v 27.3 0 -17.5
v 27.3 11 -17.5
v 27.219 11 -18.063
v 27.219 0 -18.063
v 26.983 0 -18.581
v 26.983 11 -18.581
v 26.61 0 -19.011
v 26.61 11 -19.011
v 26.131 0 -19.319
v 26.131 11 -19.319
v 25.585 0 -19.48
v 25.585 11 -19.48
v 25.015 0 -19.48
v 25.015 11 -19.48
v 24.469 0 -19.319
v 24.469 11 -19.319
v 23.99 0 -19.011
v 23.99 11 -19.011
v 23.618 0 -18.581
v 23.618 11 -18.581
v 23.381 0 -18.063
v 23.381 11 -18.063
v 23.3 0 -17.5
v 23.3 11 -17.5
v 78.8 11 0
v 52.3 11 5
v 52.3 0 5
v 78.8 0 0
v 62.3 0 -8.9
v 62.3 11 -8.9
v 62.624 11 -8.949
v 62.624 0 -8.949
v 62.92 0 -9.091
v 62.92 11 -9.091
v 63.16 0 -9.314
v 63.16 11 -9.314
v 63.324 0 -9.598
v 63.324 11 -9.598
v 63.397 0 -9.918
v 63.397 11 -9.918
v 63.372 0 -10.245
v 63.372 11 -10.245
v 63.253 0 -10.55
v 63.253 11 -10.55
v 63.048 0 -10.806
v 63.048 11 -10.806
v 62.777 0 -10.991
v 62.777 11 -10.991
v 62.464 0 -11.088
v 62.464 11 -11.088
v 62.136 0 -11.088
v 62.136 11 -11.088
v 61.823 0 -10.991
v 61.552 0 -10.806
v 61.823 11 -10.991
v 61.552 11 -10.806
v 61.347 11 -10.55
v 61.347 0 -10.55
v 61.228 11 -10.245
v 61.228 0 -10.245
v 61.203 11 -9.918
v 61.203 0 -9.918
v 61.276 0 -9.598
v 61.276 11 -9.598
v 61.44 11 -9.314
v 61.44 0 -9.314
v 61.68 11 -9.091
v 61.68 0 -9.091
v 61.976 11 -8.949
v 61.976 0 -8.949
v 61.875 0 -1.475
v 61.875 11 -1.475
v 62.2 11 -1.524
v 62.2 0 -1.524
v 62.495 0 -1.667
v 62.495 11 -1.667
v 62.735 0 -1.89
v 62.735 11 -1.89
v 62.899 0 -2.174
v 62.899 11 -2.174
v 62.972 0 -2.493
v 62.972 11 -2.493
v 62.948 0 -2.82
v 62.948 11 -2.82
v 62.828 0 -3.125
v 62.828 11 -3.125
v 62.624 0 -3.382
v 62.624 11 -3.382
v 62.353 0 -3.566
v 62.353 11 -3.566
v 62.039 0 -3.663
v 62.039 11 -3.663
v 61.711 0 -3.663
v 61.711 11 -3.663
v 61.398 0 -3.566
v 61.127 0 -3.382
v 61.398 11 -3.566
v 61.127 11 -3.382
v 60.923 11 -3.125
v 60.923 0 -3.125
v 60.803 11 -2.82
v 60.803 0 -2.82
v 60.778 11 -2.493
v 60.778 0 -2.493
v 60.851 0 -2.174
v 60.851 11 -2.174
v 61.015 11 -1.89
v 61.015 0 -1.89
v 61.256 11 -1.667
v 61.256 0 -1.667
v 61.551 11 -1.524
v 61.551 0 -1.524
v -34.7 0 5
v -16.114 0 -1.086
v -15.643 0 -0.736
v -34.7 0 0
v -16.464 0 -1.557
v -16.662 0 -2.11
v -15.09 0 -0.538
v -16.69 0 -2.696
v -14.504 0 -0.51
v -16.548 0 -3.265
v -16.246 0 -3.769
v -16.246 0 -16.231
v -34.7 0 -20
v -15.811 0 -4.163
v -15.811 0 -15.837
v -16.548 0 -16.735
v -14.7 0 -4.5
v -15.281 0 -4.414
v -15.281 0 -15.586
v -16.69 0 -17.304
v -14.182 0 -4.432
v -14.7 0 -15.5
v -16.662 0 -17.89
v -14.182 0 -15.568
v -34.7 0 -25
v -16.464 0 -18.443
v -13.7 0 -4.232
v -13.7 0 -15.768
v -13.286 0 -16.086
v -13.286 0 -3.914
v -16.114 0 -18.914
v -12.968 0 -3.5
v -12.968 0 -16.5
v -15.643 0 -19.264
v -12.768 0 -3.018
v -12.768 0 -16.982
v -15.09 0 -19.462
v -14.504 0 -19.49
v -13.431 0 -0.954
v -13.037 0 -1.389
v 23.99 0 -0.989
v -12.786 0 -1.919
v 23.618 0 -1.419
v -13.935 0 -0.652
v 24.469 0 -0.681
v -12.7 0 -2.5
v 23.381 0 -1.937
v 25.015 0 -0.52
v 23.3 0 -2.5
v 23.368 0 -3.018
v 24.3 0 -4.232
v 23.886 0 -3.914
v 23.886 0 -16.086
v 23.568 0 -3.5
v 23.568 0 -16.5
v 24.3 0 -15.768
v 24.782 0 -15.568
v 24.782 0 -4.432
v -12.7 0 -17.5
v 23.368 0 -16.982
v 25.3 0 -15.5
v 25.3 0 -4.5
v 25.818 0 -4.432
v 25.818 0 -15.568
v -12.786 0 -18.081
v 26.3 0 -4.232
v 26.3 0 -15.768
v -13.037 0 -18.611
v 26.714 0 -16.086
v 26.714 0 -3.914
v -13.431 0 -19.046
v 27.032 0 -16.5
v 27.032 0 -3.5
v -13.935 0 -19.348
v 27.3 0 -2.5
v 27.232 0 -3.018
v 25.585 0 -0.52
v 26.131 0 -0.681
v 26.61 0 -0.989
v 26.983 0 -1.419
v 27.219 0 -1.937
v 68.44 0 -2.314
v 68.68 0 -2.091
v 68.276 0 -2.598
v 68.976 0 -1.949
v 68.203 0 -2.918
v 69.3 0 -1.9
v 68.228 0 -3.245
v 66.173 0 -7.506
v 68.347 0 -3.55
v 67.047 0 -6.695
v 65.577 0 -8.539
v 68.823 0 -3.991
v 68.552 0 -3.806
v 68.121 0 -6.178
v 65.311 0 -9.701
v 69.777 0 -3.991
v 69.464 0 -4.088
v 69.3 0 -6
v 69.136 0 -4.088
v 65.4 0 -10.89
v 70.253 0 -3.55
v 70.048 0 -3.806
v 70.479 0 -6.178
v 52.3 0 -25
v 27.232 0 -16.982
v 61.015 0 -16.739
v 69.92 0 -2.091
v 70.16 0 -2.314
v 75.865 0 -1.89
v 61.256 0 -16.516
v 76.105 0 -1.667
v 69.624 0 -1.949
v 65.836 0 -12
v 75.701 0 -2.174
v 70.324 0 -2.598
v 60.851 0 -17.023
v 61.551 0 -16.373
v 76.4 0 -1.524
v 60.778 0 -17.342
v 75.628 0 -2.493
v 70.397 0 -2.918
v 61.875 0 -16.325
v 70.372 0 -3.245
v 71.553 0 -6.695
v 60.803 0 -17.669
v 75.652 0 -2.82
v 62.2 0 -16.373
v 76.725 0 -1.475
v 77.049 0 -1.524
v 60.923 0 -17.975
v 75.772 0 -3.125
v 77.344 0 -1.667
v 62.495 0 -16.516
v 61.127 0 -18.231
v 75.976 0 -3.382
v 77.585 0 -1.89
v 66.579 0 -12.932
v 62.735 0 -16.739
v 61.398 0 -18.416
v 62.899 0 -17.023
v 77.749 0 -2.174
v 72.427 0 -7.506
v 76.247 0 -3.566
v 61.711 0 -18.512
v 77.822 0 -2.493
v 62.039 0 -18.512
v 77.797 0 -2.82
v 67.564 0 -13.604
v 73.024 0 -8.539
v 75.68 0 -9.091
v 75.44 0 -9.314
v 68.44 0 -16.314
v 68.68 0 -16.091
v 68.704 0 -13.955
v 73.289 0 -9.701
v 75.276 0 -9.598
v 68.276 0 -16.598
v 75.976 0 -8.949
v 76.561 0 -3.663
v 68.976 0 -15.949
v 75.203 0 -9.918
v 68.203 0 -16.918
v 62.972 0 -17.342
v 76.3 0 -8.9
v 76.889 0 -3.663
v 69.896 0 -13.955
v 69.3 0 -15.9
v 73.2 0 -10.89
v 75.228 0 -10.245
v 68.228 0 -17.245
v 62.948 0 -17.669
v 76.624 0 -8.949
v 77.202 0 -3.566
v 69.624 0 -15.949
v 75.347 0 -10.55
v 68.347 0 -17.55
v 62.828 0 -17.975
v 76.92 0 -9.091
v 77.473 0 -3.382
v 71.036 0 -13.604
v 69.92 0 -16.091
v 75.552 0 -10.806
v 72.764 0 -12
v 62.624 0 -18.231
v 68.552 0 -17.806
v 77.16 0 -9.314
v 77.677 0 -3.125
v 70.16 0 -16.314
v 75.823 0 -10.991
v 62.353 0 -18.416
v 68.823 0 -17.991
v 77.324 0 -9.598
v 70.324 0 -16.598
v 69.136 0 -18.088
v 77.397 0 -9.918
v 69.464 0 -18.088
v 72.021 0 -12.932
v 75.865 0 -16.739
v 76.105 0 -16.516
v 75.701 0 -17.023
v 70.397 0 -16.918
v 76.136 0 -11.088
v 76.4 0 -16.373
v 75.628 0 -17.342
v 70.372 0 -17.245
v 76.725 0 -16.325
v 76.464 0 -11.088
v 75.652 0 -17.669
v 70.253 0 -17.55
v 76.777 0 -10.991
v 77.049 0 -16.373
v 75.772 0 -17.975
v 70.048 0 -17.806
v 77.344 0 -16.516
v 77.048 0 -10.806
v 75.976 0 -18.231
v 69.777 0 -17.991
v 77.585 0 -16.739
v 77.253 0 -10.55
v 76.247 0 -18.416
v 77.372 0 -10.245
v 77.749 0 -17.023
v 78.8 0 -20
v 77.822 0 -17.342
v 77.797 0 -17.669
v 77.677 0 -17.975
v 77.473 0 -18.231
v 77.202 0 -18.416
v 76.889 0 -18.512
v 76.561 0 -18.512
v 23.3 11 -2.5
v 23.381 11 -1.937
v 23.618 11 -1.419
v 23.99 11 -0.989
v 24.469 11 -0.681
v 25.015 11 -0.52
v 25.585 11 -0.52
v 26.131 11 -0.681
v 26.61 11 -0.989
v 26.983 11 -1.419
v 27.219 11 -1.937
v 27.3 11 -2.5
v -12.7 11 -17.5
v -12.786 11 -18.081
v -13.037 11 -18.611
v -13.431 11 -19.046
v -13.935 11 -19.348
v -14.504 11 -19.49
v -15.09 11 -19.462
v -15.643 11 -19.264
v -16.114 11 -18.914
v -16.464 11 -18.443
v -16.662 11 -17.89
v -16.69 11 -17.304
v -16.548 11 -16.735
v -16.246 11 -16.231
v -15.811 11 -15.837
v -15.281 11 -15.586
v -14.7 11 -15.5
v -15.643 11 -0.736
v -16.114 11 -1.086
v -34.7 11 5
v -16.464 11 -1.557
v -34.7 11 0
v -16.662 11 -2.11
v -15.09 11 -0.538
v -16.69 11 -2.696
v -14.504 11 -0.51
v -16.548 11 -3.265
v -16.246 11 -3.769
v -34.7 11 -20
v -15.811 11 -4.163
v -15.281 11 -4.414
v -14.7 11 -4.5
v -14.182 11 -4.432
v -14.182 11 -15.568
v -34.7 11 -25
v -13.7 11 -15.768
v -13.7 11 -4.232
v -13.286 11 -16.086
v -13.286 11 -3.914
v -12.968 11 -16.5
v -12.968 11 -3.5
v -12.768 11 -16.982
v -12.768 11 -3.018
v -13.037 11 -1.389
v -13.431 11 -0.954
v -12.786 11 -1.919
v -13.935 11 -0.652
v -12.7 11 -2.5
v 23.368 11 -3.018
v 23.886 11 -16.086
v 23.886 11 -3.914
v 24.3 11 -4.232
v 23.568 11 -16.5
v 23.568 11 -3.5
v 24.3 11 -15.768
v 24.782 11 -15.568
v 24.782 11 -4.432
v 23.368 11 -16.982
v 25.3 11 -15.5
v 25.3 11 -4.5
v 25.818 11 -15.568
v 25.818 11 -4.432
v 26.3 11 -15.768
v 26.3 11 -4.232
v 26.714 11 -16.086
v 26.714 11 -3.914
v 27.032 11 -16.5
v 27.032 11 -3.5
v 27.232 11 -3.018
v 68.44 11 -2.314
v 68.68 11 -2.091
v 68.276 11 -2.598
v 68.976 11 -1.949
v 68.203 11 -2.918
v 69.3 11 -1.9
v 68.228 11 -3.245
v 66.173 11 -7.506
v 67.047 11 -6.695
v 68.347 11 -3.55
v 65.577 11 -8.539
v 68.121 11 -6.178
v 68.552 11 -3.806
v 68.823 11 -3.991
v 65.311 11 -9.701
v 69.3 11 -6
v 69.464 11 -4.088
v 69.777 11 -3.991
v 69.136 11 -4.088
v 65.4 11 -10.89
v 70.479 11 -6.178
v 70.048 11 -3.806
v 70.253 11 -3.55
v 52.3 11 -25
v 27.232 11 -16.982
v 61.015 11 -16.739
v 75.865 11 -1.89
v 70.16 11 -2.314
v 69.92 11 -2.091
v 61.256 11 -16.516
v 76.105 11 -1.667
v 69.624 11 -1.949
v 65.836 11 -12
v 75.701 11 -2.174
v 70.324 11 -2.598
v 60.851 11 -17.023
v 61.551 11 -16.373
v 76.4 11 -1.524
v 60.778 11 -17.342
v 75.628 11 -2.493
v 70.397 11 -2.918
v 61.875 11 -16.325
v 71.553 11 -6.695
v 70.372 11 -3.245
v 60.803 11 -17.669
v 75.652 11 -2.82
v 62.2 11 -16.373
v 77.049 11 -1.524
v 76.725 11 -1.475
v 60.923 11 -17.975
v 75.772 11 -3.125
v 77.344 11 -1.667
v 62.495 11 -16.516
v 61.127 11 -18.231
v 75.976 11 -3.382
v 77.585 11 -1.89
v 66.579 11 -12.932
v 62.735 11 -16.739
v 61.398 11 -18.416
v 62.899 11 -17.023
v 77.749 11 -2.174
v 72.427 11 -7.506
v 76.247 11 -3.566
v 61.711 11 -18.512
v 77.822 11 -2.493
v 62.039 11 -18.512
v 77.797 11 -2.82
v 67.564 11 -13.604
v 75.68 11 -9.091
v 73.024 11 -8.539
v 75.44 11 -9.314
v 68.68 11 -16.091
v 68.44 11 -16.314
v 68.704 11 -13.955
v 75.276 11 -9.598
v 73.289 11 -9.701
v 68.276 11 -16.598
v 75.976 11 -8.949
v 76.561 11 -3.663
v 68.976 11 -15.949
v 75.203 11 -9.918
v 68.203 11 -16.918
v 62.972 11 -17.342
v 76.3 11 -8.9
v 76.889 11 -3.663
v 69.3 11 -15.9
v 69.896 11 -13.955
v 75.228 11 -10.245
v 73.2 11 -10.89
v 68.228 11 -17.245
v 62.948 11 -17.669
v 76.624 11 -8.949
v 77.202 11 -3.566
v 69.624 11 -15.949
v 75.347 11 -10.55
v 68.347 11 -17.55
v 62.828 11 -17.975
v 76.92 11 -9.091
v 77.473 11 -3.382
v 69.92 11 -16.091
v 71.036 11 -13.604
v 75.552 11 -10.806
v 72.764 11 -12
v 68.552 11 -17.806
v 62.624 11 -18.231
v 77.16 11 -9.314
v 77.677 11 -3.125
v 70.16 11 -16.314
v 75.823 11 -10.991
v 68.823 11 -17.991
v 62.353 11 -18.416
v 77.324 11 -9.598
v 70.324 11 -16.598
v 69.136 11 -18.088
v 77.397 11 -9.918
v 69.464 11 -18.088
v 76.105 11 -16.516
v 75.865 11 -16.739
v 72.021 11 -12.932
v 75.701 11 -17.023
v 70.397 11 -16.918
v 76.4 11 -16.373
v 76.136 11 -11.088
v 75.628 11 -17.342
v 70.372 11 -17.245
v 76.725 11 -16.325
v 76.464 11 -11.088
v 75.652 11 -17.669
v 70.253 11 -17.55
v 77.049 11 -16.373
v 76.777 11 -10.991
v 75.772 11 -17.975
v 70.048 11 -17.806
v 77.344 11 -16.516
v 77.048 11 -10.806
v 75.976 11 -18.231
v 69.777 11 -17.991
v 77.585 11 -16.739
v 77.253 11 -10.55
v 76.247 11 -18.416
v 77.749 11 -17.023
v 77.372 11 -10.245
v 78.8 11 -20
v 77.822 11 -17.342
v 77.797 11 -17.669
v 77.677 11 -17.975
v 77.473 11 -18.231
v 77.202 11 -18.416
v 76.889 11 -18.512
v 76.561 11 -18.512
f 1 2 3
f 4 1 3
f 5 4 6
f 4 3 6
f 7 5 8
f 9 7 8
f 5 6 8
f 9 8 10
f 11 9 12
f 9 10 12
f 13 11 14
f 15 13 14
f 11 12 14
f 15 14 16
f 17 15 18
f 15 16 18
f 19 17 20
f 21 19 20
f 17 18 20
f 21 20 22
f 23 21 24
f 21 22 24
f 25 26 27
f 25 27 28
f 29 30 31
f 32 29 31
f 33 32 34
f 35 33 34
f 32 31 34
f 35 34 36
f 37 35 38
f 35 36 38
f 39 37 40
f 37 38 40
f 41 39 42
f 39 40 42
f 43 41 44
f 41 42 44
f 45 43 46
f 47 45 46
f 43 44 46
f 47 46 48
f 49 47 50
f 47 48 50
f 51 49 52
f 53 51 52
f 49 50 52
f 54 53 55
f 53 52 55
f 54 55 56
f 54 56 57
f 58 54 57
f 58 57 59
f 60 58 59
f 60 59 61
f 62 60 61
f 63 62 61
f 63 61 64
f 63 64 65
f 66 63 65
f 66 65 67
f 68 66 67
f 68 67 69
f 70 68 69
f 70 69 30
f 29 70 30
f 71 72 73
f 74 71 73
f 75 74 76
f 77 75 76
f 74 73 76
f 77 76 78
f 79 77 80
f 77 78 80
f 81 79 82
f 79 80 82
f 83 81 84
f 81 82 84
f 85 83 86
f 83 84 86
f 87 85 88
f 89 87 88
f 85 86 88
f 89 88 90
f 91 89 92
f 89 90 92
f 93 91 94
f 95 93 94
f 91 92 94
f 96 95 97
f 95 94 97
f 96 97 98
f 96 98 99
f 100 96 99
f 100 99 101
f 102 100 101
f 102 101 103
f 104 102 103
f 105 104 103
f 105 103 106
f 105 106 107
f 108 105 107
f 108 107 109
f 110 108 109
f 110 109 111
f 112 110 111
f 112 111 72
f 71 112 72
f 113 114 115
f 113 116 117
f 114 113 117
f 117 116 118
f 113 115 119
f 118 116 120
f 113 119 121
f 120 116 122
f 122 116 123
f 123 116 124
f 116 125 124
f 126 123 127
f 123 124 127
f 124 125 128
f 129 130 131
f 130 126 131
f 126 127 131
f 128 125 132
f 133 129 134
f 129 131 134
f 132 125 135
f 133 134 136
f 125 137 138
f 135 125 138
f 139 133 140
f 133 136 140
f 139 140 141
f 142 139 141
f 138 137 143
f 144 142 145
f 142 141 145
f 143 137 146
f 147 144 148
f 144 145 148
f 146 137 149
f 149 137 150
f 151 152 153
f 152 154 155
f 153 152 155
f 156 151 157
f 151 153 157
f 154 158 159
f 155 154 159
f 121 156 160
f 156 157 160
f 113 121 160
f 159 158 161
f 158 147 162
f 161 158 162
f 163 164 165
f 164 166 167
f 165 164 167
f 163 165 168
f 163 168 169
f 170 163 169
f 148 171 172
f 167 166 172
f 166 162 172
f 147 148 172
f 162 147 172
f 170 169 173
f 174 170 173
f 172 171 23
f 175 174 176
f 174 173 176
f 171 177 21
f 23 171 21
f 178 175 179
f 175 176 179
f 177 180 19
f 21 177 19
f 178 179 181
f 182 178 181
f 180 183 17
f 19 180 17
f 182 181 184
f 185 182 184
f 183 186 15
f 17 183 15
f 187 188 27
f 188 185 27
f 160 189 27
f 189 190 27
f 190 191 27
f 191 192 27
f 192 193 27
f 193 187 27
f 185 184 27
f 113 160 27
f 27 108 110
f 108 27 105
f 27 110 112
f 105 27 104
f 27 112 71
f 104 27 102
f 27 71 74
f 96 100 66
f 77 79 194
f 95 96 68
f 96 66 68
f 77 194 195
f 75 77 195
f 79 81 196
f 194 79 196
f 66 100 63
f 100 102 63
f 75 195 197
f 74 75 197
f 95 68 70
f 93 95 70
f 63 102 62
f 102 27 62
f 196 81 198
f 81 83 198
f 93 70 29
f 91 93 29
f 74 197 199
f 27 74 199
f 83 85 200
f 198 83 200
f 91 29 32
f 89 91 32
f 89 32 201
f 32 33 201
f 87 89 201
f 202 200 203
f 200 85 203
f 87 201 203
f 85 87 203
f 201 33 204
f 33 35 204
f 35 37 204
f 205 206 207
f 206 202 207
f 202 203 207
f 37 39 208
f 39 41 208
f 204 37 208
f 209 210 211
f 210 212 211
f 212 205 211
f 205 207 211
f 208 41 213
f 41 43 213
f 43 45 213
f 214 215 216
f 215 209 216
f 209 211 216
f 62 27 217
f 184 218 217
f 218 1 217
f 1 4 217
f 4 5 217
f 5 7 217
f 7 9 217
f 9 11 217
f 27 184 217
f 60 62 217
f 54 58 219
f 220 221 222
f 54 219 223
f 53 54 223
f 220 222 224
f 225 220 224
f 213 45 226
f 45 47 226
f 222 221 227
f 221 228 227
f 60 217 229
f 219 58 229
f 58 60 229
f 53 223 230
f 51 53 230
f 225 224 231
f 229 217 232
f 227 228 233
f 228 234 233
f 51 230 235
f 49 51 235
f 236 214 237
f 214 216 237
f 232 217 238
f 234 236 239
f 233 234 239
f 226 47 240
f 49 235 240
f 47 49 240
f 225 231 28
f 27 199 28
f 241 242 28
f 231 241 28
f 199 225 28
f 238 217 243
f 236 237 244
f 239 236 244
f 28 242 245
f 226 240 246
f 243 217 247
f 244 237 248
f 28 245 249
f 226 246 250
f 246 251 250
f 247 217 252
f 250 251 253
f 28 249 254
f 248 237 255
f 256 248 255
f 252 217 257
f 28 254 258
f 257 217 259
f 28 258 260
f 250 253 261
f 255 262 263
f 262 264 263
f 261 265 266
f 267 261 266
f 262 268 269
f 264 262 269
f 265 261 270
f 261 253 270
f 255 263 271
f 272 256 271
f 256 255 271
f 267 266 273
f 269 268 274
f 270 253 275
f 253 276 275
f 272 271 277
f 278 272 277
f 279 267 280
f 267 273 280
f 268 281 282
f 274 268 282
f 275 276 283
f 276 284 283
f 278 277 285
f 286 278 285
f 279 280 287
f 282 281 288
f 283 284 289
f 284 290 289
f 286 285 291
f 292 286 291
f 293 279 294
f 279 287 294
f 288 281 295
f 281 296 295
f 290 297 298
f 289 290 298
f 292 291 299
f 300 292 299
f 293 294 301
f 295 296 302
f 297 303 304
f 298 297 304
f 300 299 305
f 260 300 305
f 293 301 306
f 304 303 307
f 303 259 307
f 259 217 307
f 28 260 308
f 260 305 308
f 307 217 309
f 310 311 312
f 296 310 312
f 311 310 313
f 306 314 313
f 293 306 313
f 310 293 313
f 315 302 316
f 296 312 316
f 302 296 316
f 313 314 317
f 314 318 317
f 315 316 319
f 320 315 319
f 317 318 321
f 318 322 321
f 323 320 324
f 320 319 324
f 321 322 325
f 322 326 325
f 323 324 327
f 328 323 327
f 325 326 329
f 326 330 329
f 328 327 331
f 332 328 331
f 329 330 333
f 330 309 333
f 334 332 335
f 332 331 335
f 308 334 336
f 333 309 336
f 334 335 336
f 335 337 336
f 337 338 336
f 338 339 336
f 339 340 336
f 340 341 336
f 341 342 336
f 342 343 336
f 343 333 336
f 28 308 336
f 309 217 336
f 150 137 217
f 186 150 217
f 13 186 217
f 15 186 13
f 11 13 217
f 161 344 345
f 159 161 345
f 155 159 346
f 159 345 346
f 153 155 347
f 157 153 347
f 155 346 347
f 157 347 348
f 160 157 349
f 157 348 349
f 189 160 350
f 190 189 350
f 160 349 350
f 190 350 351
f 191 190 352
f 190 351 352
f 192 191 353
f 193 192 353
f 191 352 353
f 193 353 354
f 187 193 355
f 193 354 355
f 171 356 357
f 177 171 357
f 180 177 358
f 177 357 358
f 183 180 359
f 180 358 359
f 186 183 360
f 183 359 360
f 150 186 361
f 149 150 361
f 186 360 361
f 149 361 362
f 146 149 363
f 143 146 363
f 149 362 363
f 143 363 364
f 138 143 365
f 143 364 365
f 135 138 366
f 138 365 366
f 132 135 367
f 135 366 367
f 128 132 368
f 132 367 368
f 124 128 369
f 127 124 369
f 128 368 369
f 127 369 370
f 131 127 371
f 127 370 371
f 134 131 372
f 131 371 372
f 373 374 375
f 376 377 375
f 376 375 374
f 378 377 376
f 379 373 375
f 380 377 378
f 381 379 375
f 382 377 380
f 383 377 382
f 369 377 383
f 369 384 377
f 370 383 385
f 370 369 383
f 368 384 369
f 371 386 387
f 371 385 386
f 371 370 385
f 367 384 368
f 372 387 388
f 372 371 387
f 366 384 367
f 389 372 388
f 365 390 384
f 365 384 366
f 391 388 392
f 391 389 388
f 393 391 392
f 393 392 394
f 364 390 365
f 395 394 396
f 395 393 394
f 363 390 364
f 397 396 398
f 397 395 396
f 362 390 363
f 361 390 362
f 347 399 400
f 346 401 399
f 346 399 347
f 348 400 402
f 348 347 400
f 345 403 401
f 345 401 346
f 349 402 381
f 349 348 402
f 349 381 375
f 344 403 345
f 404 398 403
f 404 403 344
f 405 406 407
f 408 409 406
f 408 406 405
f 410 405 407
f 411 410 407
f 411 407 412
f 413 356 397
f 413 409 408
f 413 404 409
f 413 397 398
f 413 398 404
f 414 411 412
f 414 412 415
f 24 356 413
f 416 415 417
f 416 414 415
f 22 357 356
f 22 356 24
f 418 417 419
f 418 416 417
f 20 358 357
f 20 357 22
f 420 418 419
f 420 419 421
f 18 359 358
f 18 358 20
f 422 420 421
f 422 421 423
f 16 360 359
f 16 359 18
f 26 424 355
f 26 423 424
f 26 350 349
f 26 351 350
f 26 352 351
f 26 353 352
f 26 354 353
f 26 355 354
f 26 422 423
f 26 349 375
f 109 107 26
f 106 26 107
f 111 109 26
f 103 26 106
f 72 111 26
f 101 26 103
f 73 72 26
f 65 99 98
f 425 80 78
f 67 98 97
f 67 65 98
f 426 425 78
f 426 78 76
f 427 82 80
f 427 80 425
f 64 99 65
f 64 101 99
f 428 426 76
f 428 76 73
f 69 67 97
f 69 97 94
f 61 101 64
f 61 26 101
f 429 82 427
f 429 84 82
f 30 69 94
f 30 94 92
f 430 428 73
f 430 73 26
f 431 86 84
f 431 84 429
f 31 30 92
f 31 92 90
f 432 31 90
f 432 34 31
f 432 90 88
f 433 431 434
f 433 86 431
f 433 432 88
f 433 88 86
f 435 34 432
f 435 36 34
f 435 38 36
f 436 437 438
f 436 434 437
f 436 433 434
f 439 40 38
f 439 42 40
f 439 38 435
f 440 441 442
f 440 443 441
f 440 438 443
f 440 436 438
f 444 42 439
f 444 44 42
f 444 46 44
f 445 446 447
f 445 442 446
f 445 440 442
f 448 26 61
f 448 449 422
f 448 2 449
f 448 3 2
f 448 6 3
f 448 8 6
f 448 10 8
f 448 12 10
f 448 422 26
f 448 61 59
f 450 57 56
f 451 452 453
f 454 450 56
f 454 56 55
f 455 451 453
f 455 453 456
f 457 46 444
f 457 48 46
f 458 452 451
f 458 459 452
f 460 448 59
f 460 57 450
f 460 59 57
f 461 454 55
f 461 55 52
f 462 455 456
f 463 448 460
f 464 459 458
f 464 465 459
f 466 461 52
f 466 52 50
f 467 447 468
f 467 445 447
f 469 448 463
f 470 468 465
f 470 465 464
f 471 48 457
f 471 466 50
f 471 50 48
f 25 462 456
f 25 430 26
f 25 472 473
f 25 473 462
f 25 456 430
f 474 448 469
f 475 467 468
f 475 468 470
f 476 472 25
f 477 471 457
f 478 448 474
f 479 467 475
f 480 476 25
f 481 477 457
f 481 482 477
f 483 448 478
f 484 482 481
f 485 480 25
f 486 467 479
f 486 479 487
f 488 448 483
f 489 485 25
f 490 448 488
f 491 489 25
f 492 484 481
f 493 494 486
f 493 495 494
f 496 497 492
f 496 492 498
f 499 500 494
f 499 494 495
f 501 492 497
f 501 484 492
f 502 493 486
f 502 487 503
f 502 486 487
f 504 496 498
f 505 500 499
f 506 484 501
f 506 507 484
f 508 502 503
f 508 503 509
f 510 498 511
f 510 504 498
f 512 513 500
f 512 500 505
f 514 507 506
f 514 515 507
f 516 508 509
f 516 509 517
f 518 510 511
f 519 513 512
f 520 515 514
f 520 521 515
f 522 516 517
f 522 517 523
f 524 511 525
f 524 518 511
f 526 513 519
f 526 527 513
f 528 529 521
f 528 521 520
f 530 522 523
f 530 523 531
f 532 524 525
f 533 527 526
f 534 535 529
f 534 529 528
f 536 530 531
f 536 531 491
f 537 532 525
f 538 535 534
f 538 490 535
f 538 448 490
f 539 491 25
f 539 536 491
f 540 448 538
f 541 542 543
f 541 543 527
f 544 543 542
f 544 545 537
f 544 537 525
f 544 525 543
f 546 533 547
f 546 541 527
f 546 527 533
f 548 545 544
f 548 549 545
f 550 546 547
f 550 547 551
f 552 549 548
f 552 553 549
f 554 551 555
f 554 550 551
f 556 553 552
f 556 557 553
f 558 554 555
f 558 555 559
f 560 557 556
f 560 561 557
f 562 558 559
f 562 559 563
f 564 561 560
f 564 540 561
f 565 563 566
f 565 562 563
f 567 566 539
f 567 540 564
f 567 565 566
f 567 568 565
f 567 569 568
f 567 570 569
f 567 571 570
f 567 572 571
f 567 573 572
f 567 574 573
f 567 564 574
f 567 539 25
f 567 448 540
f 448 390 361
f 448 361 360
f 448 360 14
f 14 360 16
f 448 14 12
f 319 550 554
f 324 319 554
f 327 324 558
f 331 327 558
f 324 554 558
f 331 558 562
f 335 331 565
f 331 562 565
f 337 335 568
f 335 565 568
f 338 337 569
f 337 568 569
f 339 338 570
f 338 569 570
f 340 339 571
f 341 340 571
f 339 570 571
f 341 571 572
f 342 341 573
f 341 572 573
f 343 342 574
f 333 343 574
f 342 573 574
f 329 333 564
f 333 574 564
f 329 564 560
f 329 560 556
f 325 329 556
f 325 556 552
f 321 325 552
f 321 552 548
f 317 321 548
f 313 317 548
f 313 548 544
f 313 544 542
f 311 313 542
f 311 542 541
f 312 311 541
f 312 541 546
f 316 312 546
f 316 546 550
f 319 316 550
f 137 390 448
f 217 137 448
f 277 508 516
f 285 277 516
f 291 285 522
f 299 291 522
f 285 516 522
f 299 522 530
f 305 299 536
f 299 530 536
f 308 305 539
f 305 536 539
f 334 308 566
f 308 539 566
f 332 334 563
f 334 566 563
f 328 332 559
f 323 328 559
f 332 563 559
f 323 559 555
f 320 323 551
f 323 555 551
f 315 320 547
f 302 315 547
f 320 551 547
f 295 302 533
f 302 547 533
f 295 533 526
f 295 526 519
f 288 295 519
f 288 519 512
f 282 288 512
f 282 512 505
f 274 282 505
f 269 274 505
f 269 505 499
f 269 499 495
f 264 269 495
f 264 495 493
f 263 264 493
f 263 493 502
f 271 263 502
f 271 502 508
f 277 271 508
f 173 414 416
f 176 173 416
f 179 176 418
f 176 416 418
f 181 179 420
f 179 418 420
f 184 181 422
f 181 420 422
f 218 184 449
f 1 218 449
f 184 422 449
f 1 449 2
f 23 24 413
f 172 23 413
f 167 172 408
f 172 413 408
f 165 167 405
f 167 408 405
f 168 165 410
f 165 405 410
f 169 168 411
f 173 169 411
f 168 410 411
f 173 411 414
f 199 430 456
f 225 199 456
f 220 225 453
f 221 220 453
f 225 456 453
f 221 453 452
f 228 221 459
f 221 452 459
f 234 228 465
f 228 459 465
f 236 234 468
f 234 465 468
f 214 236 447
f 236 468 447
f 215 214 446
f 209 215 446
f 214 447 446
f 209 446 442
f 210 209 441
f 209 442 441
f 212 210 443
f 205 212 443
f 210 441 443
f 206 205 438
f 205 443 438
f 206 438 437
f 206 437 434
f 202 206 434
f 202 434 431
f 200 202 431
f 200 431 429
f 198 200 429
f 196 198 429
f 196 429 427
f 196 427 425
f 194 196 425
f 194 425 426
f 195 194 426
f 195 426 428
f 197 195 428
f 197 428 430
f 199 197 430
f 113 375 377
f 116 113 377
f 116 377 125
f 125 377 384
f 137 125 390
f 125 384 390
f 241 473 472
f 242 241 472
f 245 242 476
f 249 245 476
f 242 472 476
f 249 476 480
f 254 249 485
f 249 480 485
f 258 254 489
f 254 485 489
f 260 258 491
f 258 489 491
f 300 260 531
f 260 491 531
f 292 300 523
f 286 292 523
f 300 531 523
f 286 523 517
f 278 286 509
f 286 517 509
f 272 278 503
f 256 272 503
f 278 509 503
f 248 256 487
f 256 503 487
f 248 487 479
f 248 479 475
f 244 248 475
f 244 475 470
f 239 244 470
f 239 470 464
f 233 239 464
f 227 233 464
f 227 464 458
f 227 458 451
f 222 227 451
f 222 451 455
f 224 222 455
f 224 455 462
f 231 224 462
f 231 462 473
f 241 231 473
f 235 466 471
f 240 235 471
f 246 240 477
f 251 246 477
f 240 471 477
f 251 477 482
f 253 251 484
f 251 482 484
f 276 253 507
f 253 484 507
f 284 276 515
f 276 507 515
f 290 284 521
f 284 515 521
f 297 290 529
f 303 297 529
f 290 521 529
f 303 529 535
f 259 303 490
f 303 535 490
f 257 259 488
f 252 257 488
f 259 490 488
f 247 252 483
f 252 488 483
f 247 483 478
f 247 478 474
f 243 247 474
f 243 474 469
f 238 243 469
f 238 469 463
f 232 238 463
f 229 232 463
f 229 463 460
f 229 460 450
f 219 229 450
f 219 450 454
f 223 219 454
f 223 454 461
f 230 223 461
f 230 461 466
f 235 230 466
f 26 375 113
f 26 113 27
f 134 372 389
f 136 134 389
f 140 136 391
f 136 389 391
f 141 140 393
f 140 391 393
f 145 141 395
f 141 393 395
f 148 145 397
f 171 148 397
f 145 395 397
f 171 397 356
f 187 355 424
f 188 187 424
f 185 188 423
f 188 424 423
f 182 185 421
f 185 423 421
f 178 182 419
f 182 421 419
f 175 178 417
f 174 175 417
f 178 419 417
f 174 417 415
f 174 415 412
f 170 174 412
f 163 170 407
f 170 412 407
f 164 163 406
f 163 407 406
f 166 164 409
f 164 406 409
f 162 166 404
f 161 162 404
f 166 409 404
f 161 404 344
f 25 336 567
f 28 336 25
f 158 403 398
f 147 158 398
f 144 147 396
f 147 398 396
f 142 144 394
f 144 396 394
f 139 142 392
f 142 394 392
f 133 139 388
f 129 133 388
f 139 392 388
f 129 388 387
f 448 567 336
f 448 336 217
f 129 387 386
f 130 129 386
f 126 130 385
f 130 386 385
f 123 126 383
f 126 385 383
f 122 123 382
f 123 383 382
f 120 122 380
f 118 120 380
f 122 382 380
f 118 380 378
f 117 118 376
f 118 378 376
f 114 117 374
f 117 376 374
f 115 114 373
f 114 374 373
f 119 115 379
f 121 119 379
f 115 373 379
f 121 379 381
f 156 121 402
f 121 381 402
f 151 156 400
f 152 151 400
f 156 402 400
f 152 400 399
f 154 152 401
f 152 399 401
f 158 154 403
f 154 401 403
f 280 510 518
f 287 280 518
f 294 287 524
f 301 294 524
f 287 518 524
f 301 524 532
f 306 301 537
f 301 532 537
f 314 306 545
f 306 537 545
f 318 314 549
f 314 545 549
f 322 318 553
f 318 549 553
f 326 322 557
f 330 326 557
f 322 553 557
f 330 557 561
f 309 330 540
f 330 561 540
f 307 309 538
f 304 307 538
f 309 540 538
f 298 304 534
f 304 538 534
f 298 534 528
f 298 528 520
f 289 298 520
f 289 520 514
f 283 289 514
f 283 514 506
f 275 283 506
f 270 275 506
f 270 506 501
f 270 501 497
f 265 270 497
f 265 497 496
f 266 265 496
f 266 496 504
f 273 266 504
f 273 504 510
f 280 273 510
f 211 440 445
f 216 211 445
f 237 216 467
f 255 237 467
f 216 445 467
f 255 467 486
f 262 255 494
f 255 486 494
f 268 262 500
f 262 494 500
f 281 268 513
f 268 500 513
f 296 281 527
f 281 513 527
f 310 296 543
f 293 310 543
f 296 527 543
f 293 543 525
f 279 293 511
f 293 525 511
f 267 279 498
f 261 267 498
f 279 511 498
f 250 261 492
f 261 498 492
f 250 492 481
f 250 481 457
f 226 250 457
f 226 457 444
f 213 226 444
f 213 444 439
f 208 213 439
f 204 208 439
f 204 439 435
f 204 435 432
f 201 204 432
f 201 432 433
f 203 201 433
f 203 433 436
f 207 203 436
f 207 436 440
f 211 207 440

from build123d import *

# Parameters (mm, degrees)
EXTRUDE_1_DEPTH     = 11
SKETCH_2_R          = 1.5
SKETCH_2_R_2        = 4
CUT_EXTRUDE_1_DEPTH = 10
SKETCH_4_R          = 4
SKETCH_4_R_2        = 1.1
CUT_EXTRUDE_4_DEPTH = 20
SKETCH_5_W          = 18.664238265
SKETCH_5_H          = 20
CUT_EXTRUDE_5_DEPTH = 20
SKETCH_6_W          = 87
SKETCH_6_H          = 5
EXTRUDE_2_DEPTH     = 11
CUT_EXTRUDE_6_DEPTH = 11


with BuildPart() as part:
    # 草图1 → 凸台-拉伸1 (new body)
    with BuildSketch(Plane(origin=(0, 0, 0), x_dir=(1, 0, 0), z_dir=(0, 1, 0))):
        with BuildLine():
            Line((-41.199983302, 20), (78.800016698, 20))
            Line((78.800016698, 20), (78.800016698, 0))
            Line((78.800016698, 0), (-41.199983302, 0))
            ThreePointArc((-41.199983302, 0), (-51.199983302, 10), (-41.199983302, 20))
        make_face()
    extrude(amount=EXTRUDE_1_DEPTH)

    # 草图2 → 切除-拉伸1 (cut)
    with BuildSketch(Plane(origin=(0, 11, 0), x_dir=(1, 0, 0), z_dir=(0, 1, 0))):
        with Locations(Location((-48.199983302, 10, 0), (0, 0, 270))):
            Circle(SKETCH_2_R)
        with BuildLine():
            ThreePointArc((-39.699983302, 17), (-40.13932313, 18.060660172), (-41.199983302, 18.5))
            Line((-41.199983302, 18.5), (-41.199983302, 17))
            Line((-41.199983302, 17), (-41.199983302, 15.5))
            ThreePointArc((-41.199983302, 15.5), (-40.13932313, 15.939339828), (-39.699983302, 17))
        make_face()
        with BuildLine():
            Line((-41.199983302, 17), (-41.199983302, 18.5))
            ThreePointArc((-41.199983302, 18.5), (-42.699983302, 17), (-41.199983302, 15.5))
            Line((-41.199983302, 15.5), (-41.199983302, 17))
        make_face()
        with BuildLine():
            ThreePointArc((-39.699983302, 3), (-40.13932313, 4.060660172), (-41.199983302, 4.5))
            Line((-41.199983302, 4.5), (-41.199983302, 3))
            Line((-41.199983302, 3), (-41.199983302, 1.5))
            ThreePointArc((-41.199983302, 1.5), (-40.13932313, 1.939339828), (-39.699983302, 3))
        make_face()
        with BuildLine():
            Line((-41.199983302, 3), (-41.199983302, 4.5))
            ThreePointArc((-41.199983302, 4.5), (-42.699983302, 3), (-41.199983302, 1.5))
            Line((-41.199983302, 1.5), (-41.199983302, 3))
        make_face()
        with Locations(Location((-41.199983302, 10, 0), (0, 0, 270))):
            Circle(SKETCH_2_R_2)
    extrude(amount=-CUT_EXTRUDE_1_DEPTH, mode=Mode.SUBTRACT)

    # 草图4 → 切除-拉伸4 (cut)
    with BuildSketch(Plane(origin=(0, 11, 0), x_dir=(1, 0, 0), z_dir=(0, 1, 0))):
        with Locations(Location((69.300016698, 10, 0), (0, 0, 270))):
            Circle(SKETCH_4_R)
        with Locations(Location((76.7246379, 17.424621202, 0), (0, 0, 270))):
            Circle(SKETCH_4_R_2)
        with Locations(Location((62.300016698, 10, 0), (0, 0, 270))):
            Circle(SKETCH_4_R_2)
        with Locations(Location((76.7246379, 2.575378798, 0), (0, 0, 270))):
            Circle(SKETCH_4_R_2)
        with Locations(Location((61.875395496, 2.575378798, 0), (0, 0, 270))):
            Circle(SKETCH_4_R_2)
        with Locations(Location((61.875395496, 17.424621202, 0), (0, 0, 270))):
            Circle(SKETCH_4_R_2)
        with Locations(Location((69.300016698, 17, 0), (0, 0, 270))):
            Circle(SKETCH_4_R_2)
        with Locations(Location((76.300016698, 10, 0), (0, 0, 270))):
            Circle(SKETCH_4_R_2)
        with Locations(Location((69.300016698, 3, 0), (0, 0, 270))):
            Circle(SKETCH_4_R_2)
    extrude(amount=-CUT_EXTRUDE_4_DEPTH, mode=Mode.SUBTRACT)

    # 草图5 → 切除-拉伸5 (cut)
    with BuildSketch(Plane.XZ):
        with Locations((-44.032102435, -10)):
            Rectangle(SKETCH_5_W, SKETCH_5_H)
    extrude(amount=-CUT_EXTRUDE_5_DEPTH, mode=Mode.SUBTRACT)

    # 草图6 → 凸台-拉伸2 (add)
    with BuildSketch(Plane(origin=(0, 11, 0), x_dir=(1, 0, 0), z_dir=(0, 1, 0))):
        Polygon((78.800016698, 20), (52.300016698, 25), (52.300016698, 20), align=None)
        Polygon((78.800016698, 0), (52.300016698, 0), (52.300016698, -5), align=None)
        with Locations((8.800016698, 22.5)):
            Rectangle(SKETCH_6_W, SKETCH_6_H)
        with Locations((8.800016698, -2.5)):
            Rectangle(SKETCH_6_W, SKETCH_6_H)
    extrude(amount=-EXTRUDE_2_DEPTH)

    # 草图7 → 切除-拉伸6 (cut)
    with BuildSketch(Plane(origin=(0, 11, 0), x_dir=(1, 0, 0), z_dir=(0, 1, 0))):
        with BuildLine():
            Line((23.300016698, 17.5), (25.300016698, 17.5))
            Line((25.300016698, 17.5), (25.300016698, 15.5))
            ThreePointArc((25.300016698, 15.5), (26.71423026, 16.085786438), (27.300016698, 17.5))
            ThreePointArc((27.300016698, 17.5), (25.300016698, 19.5), (23.300016698, 17.5))
        make_face()
        with BuildLine():
            Line((25.300016698, 15.5), (25.300016698, 17.5))
            Line((25.300016698, 17.5), (23.300016698, 17.5))
            ThreePointArc((23.300016698, 17.5), (23.885803136, 16.085786438), (25.300016698, 15.5))
        make_face()
        with BuildLine():
            ThreePointArc((27.300016698, 2.5), (26.71423026, 3.914213562), (25.300016698, 4.5))
            Line((25.300016698, 4.5), (25.300016698, 2.5))
            Line((25.300016698, 2.5), (23.300016698, 2.5))
            ThreePointArc((23.300016698, 2.5), (25.300016698, 0.5), (27.300016698, 2.5))
        make_face()
        with BuildLine():
            Line((25.300016698, 2.5), (25.300016698, 4.5))
            ThreePointArc((25.300016698, 4.5), (23.885803136, 3.914213562), (23.300016698, 2.5))
            Line((23.300016698, 2.5), (25.300016698, 2.5))
        make_face()
        with BuildLine():
            ThreePointArc((-14.699983302, 15.5), (-13.28576974, 16.085786438), (-12.699983302, 17.5))
            Line((-12.699983302, 17.5), (-14.699983302, 17.5))
            Line((-14.699983302, 17.5), (-14.699983302, 15.5))
        make_face()
        with BuildLine():
            Line((-14.699983302, 17.5), (-12.699983302, 17.5))
            ThreePointArc((-12.699983302, 17.5), (-16.114196864, 18.914213562), (-14.699983302, 15.5))
            Line((-14.699983302, 15.5), (-14.699983302, 17.5))
        make_face()
        with BuildLine():
            ThreePointArc((-14.699983302, 4.5), (-16.114196864, 1.085786438), (-12.699983302, 2.5))
            Line((-12.699983302, 2.5), (-14.699983302, 2.5))
            Line((-14.699983302, 2.5), (-14.699983302, 4.5))
        make_face()
        with BuildLine():
            Line((-14.699983302, 2.5), (-12.699983302, 2.5))
            ThreePointArc((-12.699983302, 2.5), (-13.28576974, 3.914213562), (-14.699983302, 4.5))
            Line((-14.699983302, 4.5), (-14.699983302, 2.5))
        make_face()
    extrude(amount=-CUT_EXTRUDE_6_DEPTH, mode=Mode.SUBTRACT)


solid = part.part
